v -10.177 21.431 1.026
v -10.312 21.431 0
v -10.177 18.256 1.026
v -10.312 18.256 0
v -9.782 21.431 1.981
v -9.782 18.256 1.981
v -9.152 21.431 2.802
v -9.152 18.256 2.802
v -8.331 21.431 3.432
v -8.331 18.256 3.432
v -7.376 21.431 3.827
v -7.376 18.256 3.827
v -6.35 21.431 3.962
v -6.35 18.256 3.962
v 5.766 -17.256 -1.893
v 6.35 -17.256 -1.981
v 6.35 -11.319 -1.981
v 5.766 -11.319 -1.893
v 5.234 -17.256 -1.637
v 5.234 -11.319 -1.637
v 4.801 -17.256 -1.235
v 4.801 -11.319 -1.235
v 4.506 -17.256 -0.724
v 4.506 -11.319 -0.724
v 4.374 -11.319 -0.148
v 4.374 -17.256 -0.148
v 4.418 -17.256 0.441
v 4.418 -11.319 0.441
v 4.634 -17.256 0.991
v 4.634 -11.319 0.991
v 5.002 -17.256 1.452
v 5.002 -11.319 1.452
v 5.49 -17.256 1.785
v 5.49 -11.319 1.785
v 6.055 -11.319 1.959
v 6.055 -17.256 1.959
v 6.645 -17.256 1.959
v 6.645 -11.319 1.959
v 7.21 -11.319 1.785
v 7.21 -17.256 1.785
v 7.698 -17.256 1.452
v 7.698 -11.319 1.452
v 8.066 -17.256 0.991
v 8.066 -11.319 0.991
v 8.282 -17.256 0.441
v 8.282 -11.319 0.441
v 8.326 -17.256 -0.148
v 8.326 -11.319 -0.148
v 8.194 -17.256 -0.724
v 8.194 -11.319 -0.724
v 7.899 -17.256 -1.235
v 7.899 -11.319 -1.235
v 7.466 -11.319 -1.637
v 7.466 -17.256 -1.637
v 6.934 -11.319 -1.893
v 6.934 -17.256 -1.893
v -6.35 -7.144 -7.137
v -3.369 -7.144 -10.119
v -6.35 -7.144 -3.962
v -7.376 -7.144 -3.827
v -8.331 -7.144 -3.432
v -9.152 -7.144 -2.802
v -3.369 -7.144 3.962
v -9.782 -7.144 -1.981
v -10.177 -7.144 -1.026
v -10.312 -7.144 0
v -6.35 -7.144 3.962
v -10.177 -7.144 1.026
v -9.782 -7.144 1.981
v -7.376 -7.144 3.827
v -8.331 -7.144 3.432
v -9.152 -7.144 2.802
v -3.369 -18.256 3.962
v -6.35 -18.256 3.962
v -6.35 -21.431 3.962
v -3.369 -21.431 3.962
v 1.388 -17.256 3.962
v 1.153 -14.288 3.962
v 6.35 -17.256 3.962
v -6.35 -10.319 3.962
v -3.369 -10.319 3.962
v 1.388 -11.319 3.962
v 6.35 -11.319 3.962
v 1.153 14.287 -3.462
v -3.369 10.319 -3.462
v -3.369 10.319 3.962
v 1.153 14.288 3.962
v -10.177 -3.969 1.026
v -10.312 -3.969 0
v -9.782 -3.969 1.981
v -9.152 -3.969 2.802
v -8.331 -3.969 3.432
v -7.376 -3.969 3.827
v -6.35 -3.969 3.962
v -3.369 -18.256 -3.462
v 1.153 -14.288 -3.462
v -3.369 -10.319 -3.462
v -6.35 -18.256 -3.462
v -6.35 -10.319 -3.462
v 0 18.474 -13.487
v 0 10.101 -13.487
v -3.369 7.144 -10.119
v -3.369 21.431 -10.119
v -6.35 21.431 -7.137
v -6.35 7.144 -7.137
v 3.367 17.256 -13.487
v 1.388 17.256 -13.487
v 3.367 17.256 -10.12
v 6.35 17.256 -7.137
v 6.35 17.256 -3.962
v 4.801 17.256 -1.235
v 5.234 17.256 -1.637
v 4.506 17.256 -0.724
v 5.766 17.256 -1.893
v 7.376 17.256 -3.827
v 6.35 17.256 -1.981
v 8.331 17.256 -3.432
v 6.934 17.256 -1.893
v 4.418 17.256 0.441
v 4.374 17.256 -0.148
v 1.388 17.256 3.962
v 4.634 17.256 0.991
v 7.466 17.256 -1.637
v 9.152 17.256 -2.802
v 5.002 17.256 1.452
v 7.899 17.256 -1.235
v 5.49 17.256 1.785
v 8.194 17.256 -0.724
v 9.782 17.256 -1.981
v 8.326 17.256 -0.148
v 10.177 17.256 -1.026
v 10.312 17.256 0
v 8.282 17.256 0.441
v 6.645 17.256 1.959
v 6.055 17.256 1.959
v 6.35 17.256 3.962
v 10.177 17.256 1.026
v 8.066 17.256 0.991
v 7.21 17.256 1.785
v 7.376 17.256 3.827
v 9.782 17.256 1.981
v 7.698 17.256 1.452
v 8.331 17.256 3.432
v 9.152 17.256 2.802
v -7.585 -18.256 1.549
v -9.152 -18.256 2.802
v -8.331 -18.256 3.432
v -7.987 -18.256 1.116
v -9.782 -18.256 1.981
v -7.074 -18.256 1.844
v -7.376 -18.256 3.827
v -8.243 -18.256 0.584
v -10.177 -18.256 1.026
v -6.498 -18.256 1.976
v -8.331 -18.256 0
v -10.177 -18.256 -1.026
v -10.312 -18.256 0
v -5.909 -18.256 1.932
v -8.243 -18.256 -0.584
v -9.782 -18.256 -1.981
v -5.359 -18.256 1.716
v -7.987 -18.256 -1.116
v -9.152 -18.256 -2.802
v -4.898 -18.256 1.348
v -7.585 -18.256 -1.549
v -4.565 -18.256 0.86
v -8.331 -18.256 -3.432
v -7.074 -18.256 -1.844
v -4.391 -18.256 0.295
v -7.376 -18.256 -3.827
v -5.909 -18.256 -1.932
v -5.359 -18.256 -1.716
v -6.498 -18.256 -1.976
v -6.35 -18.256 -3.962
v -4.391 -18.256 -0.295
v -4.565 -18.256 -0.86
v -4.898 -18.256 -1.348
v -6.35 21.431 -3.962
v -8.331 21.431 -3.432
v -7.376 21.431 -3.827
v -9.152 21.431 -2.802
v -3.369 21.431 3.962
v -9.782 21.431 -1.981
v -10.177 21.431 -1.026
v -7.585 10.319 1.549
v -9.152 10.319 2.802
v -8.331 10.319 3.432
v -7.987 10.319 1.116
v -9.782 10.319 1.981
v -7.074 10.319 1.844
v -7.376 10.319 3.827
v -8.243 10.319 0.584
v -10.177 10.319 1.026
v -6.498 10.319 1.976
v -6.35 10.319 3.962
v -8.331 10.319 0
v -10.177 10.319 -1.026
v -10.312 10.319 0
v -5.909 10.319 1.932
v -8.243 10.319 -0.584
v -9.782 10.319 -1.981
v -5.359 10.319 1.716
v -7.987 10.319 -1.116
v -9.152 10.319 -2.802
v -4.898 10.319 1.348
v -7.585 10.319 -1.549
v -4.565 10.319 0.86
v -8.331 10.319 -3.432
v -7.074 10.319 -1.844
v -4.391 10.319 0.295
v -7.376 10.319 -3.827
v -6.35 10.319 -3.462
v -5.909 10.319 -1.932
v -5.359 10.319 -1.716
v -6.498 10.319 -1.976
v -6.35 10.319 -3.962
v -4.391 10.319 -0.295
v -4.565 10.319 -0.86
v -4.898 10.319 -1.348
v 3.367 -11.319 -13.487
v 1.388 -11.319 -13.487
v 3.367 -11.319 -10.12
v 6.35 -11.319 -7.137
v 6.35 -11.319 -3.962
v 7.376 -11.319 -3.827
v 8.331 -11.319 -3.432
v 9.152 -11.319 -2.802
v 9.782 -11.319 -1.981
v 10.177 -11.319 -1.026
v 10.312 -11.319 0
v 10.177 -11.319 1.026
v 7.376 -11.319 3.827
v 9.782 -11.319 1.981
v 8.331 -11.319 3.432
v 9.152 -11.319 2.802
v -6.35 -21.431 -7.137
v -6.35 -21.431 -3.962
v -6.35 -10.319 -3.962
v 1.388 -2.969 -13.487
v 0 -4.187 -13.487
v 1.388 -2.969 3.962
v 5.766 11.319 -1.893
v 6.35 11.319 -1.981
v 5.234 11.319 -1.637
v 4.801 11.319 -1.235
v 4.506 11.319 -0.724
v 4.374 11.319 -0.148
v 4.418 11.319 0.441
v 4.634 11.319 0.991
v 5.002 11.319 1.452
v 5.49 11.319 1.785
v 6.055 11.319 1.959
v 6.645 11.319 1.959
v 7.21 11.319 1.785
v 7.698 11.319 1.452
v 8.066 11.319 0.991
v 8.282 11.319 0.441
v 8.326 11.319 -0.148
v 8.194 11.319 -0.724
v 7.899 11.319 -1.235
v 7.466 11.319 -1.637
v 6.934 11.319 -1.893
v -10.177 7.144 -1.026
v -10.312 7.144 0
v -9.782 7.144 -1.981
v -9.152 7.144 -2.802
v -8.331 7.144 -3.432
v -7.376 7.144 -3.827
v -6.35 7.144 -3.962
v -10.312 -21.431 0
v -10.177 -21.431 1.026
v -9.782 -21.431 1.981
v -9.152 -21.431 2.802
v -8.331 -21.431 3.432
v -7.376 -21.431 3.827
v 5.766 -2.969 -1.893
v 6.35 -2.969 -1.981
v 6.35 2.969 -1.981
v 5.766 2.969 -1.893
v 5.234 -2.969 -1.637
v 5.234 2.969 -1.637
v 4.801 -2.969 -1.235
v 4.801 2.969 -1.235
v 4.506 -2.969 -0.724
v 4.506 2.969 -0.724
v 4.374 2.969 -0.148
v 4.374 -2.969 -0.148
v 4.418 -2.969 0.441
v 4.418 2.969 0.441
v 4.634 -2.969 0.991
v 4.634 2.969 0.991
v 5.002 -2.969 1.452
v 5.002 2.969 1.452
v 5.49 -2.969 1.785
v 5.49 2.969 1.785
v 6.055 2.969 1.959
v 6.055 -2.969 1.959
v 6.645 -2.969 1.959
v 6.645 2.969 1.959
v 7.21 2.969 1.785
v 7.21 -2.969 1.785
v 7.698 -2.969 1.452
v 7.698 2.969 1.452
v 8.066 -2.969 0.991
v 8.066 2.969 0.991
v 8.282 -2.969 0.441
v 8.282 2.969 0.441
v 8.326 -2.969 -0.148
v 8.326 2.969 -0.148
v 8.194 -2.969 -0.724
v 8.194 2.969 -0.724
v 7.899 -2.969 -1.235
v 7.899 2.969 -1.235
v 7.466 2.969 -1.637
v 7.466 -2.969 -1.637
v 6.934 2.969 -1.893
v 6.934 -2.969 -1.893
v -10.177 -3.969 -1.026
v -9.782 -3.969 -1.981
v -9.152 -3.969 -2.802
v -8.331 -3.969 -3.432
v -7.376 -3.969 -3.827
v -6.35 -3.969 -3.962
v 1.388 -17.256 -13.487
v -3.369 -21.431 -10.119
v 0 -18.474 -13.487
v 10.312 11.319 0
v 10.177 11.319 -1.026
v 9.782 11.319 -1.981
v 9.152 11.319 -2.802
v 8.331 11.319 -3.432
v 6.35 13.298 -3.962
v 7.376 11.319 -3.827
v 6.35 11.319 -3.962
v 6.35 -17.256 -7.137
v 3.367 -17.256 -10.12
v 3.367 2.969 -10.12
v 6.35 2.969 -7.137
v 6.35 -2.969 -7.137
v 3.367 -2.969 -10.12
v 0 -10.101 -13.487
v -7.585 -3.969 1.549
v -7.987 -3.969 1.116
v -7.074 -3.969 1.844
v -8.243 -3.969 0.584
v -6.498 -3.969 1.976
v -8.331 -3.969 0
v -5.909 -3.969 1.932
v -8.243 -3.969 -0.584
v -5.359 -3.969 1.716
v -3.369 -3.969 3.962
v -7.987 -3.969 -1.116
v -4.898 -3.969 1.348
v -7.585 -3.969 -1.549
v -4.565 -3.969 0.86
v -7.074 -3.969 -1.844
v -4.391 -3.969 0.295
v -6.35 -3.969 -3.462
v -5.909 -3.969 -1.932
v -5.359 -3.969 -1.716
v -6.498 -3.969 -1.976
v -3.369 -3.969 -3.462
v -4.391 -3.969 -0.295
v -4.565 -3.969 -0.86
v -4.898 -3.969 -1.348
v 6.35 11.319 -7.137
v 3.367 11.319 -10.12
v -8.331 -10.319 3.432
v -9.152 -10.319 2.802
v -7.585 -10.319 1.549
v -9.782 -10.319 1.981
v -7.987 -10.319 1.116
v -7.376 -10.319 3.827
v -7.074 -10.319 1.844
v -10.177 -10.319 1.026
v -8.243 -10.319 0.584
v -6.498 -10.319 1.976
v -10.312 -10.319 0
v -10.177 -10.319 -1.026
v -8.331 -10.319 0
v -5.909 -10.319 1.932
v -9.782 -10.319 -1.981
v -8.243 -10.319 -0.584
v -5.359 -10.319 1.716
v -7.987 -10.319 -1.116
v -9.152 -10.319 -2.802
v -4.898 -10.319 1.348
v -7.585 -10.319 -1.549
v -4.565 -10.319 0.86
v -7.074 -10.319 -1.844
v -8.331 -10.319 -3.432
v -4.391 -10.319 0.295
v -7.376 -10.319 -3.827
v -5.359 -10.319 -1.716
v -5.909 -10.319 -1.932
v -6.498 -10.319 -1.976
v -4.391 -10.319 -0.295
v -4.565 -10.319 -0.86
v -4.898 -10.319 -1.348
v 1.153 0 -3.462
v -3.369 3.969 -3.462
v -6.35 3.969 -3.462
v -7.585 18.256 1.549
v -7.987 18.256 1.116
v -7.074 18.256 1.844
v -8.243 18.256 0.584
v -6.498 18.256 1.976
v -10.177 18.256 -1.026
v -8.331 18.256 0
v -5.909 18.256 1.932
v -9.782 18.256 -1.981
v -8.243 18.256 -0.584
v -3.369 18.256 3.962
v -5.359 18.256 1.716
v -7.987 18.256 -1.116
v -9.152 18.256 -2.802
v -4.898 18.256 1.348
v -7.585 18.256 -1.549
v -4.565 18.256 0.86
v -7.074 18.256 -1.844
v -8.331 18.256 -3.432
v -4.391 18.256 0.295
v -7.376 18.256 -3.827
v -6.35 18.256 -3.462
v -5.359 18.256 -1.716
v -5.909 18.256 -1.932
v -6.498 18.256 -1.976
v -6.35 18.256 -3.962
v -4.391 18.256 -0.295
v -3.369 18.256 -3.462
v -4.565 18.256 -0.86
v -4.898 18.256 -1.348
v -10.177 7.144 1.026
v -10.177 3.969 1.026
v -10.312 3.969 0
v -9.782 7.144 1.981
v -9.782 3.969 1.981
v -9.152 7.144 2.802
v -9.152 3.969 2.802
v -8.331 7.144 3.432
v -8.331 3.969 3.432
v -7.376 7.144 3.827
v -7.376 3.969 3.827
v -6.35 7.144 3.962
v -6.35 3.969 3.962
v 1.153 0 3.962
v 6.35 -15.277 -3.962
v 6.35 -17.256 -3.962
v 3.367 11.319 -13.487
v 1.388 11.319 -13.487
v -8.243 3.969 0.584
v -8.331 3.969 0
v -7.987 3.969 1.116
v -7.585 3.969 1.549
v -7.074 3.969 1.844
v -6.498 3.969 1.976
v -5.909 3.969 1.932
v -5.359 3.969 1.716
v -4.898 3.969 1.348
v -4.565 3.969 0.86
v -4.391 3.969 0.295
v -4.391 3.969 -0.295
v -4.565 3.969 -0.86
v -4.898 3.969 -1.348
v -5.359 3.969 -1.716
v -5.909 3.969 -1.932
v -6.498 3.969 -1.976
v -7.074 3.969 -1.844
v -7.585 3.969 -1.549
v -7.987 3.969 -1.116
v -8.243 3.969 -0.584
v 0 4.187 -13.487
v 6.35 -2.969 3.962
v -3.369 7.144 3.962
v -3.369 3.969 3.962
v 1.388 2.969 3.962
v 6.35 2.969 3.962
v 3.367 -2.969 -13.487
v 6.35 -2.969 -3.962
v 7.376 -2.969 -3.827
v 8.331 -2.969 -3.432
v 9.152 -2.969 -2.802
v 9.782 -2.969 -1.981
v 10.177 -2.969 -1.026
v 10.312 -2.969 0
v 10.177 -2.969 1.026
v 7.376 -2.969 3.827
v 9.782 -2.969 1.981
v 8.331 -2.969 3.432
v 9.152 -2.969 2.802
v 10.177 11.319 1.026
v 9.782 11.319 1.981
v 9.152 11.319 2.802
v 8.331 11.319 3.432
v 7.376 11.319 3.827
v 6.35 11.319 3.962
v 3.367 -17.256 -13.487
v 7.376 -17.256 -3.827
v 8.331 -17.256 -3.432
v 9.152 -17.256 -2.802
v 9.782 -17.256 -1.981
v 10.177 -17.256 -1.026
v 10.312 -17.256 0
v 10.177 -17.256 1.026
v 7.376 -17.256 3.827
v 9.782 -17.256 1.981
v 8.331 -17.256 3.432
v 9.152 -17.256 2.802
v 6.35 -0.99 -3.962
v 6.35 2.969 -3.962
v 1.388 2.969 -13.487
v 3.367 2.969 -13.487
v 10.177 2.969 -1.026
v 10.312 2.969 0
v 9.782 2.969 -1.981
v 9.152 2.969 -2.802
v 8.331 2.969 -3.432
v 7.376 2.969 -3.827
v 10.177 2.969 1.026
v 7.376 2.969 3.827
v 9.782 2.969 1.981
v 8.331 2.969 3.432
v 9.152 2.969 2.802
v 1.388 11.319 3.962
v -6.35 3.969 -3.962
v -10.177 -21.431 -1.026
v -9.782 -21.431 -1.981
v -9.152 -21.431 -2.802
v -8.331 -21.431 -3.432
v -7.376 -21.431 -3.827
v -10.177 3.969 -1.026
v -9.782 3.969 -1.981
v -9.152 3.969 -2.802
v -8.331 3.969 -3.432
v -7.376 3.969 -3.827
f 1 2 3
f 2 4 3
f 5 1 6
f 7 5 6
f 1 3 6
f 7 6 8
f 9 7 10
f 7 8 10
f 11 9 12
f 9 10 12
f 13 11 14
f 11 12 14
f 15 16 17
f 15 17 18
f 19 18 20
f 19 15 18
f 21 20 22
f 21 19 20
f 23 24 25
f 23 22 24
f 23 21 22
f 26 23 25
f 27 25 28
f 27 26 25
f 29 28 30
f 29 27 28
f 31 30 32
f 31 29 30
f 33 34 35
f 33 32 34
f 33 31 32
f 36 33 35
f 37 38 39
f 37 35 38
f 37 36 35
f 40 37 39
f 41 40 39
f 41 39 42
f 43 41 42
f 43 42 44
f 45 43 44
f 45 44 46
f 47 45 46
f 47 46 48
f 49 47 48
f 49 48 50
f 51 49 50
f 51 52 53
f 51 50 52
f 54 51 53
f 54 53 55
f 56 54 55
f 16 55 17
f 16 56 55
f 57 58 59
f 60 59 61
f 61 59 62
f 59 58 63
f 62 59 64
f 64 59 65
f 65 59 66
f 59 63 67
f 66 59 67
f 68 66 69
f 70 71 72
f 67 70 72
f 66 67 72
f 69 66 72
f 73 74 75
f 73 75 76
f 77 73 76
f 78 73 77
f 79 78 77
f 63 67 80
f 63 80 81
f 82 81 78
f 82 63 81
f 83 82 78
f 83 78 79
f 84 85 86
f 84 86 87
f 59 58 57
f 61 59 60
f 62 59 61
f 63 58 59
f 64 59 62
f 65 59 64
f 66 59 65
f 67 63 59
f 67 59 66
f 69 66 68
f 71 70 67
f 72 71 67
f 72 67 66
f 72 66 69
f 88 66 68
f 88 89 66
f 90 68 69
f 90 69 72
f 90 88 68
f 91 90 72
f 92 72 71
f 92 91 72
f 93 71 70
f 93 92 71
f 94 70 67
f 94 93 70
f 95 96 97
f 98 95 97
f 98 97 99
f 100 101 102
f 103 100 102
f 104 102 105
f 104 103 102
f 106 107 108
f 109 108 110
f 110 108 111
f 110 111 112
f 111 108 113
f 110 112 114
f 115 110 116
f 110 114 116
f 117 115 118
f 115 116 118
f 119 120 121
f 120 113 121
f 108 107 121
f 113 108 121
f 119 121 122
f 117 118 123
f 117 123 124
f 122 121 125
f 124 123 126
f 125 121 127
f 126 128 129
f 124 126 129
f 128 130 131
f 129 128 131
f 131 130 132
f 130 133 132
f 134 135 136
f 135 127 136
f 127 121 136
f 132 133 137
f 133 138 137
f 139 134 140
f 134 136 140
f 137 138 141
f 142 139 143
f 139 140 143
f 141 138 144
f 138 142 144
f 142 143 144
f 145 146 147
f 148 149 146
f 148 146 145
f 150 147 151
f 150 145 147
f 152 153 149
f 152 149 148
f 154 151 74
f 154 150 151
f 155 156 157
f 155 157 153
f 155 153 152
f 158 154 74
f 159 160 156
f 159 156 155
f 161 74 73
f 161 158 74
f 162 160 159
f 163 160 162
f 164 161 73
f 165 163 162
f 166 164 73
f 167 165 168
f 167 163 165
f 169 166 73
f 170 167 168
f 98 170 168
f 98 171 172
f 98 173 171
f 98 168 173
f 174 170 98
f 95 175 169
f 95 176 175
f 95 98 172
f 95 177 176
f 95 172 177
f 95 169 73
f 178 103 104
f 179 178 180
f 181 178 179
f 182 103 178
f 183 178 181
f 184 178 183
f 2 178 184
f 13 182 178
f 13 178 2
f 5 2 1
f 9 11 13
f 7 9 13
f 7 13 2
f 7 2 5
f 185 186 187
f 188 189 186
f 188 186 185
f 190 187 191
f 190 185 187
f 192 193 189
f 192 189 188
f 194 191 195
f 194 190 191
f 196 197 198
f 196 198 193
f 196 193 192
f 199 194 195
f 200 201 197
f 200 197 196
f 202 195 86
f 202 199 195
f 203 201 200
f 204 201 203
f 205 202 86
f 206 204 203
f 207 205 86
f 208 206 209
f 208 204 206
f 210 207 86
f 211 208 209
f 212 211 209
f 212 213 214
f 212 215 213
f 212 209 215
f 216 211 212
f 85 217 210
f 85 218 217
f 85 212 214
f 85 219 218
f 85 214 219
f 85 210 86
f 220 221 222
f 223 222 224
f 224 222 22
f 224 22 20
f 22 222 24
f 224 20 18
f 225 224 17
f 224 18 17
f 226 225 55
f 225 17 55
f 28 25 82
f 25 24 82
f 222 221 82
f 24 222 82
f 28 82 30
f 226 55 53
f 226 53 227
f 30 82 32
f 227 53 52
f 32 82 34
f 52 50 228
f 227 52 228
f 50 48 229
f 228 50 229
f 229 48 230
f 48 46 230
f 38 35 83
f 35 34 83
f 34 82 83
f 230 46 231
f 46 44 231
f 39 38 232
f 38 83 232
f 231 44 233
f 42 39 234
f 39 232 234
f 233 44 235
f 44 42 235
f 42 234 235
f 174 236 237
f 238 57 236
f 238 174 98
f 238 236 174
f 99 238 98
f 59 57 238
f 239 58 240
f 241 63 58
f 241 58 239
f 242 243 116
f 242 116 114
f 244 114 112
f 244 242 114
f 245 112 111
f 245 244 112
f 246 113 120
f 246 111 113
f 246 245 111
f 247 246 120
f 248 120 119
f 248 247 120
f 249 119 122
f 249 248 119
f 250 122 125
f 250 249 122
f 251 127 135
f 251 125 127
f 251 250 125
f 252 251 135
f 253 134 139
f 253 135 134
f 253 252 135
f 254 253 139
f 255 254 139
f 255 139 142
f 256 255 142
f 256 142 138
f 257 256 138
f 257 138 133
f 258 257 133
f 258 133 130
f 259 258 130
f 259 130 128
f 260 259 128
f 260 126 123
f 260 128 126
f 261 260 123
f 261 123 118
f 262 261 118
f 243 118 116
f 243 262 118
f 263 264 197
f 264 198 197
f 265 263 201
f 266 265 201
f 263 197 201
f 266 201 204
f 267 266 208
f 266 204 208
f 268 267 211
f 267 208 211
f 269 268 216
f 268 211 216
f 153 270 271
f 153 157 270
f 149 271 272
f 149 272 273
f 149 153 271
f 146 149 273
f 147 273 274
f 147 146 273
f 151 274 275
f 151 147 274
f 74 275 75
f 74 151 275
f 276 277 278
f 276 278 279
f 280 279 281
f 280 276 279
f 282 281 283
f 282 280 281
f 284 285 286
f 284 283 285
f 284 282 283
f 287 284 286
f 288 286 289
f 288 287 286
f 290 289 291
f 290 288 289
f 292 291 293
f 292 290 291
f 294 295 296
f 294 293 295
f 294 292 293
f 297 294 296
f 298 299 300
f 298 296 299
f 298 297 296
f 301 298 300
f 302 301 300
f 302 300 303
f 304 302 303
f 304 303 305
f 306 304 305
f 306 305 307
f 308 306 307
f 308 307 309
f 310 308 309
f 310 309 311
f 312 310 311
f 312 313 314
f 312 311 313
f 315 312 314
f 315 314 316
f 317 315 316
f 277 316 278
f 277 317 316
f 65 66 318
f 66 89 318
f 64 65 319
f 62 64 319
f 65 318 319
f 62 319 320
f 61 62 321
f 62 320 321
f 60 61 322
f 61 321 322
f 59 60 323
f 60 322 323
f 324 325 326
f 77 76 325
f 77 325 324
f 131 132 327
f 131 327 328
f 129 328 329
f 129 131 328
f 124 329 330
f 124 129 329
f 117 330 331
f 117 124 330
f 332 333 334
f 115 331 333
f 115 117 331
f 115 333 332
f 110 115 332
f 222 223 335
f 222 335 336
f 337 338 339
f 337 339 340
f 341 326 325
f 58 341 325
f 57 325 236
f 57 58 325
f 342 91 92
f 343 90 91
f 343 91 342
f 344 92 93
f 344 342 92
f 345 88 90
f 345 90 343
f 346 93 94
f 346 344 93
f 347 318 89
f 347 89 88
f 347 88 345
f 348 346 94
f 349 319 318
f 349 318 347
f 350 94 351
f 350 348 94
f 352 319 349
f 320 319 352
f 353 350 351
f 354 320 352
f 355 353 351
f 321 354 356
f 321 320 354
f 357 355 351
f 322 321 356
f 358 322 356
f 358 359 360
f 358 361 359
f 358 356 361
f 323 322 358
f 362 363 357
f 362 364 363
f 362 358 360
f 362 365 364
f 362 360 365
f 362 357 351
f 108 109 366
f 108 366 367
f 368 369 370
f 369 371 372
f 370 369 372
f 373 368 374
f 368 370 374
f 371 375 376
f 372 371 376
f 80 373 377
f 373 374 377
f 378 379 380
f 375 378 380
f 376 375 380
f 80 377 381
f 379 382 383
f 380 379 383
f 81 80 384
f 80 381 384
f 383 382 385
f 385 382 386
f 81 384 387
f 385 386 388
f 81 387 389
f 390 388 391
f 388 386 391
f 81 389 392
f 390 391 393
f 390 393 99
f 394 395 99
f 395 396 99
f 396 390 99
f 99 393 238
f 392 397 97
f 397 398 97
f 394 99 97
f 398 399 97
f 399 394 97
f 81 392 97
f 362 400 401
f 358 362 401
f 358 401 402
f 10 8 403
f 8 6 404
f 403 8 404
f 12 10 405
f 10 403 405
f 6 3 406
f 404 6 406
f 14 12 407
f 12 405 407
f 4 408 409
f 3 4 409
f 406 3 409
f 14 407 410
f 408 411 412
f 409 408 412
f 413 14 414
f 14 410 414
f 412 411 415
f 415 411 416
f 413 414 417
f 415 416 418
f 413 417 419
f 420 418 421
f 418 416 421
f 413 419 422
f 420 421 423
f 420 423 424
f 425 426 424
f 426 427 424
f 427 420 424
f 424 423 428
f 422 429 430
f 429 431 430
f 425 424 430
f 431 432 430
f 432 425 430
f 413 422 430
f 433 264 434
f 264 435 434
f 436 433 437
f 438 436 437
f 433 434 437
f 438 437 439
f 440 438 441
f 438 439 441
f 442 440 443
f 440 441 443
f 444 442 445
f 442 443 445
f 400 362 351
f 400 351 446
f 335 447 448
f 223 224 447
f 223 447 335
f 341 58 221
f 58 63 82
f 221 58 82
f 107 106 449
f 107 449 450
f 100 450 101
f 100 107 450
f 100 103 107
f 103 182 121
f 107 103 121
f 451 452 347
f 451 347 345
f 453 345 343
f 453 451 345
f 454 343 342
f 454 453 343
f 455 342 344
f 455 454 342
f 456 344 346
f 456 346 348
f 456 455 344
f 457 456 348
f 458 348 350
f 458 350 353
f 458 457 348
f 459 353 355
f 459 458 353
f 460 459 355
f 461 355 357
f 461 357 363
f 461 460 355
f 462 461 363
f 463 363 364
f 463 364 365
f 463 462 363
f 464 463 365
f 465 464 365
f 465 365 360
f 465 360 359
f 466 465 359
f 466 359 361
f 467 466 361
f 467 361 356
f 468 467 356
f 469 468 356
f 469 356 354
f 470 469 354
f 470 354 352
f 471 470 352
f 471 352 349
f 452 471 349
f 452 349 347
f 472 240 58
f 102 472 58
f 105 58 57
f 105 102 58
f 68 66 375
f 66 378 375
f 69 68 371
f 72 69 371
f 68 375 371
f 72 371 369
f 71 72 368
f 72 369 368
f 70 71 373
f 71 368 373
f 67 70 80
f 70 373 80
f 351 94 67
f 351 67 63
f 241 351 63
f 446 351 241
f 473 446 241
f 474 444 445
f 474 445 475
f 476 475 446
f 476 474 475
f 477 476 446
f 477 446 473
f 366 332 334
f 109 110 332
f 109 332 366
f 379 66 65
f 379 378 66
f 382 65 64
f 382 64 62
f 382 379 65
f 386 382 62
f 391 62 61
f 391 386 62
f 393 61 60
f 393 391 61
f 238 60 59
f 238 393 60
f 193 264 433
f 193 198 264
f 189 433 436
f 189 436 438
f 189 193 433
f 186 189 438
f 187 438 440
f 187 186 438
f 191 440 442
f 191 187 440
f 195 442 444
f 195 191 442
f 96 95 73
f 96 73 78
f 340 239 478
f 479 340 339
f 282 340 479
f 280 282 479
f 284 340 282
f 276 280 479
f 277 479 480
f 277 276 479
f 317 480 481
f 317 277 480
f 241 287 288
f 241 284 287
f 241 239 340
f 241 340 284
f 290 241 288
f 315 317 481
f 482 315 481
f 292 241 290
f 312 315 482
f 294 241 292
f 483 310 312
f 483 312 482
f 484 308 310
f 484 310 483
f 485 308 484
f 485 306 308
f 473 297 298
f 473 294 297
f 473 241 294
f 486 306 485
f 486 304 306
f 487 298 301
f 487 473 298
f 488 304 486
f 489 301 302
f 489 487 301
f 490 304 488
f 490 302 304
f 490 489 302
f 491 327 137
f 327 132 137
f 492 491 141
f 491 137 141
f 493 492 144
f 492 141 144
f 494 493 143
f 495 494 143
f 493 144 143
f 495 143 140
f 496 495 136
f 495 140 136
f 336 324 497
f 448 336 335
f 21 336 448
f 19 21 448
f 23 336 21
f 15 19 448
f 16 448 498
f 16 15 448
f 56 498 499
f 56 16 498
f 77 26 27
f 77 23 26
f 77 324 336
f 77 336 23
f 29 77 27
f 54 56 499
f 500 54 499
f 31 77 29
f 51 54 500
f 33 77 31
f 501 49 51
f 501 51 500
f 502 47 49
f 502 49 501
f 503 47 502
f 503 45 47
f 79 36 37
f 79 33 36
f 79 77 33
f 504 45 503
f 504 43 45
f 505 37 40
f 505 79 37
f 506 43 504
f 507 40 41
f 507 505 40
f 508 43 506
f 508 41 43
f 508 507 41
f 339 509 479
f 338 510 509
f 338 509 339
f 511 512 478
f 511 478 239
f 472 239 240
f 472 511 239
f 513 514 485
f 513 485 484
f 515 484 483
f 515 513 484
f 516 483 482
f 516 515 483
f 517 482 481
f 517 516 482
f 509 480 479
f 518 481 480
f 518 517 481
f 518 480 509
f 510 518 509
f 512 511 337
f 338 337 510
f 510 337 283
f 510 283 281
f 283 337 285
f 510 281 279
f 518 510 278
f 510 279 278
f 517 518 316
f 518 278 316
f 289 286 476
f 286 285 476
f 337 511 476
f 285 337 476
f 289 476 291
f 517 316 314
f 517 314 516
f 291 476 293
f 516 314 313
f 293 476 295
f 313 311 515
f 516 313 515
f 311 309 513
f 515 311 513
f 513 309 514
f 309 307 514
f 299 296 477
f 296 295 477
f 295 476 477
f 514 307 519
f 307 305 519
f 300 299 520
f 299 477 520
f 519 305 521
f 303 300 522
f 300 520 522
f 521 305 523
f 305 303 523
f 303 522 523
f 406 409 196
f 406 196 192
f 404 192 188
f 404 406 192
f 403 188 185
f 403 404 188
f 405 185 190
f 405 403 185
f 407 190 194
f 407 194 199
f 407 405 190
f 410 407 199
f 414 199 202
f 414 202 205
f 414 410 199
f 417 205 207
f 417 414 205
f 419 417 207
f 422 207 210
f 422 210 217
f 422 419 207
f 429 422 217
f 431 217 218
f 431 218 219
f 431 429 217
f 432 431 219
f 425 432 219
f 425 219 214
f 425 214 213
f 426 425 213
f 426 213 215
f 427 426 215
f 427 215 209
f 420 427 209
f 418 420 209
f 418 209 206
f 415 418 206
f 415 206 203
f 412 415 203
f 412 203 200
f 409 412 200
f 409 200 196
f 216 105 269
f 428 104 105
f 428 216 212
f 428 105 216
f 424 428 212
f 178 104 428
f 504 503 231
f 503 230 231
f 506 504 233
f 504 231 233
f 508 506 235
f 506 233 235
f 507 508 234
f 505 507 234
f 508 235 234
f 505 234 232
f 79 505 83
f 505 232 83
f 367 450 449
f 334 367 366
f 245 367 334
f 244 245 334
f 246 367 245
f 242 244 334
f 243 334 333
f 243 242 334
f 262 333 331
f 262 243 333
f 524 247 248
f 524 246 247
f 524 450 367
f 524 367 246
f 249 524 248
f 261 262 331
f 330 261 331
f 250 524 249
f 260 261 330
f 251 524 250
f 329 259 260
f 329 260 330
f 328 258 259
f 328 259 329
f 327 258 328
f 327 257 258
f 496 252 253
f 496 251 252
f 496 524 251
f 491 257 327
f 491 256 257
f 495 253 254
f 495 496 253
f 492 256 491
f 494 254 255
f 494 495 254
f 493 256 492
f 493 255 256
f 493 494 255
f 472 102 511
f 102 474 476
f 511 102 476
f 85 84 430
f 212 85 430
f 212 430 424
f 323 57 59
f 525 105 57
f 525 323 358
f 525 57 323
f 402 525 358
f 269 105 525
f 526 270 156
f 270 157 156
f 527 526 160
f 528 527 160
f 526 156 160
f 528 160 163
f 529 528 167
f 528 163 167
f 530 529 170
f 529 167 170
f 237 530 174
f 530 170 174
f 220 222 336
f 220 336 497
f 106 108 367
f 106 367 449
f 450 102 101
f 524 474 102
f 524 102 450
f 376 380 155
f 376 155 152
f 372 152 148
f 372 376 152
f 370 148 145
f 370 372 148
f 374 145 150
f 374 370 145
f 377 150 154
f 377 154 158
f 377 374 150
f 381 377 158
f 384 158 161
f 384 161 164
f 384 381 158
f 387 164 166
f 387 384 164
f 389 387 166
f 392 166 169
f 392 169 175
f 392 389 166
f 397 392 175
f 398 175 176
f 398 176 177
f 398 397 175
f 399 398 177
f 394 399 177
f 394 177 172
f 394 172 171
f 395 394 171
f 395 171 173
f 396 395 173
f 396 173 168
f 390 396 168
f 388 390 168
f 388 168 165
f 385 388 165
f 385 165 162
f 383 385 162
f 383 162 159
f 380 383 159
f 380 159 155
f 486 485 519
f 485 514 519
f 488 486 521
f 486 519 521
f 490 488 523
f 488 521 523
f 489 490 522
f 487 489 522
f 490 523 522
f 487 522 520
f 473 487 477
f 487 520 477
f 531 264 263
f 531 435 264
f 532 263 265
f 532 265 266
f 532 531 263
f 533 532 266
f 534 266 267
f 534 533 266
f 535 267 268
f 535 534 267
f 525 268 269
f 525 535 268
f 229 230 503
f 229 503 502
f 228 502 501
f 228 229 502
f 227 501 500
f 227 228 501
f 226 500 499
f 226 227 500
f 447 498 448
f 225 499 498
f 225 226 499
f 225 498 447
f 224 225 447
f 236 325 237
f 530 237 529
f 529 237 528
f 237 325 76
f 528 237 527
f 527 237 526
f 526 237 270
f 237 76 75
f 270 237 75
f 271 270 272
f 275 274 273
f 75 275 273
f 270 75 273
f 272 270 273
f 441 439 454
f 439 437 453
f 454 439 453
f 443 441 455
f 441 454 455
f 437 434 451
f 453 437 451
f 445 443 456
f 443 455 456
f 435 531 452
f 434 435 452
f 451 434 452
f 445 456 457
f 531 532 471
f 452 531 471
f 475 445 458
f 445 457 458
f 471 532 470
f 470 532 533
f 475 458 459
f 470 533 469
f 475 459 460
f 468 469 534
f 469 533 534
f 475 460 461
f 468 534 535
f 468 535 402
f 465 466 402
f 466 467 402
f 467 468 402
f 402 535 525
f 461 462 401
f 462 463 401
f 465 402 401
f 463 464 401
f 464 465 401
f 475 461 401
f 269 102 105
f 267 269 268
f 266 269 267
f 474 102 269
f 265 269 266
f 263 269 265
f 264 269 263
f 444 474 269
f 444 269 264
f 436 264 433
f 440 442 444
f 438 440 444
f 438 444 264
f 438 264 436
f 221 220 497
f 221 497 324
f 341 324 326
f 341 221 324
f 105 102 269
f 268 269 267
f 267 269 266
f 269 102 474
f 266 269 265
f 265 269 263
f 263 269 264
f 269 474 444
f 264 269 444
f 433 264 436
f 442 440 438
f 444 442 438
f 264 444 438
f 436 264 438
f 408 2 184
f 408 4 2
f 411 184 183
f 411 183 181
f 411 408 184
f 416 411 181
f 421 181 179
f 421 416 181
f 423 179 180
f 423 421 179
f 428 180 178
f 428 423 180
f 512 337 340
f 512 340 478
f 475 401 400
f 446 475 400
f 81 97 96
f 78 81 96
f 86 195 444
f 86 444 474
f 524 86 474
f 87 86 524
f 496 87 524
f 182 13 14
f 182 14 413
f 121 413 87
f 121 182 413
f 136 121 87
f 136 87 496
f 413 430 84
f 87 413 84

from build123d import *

# Parameters (mm, degrees)
SWEEP1_START            = -3.9624
SWEEP1_DEPTH            = 7.9248
FILLET1_R               = 3.9624
BOSS_EXTRUDE3_START     = 17.25625
SKETCH1_11_R            = 3.9624
BOSS_EXTRUDE3_DEPTH     = 5.937499936
CUT_EXTRUDE4_DEPTH      = 25.111090479
CUT_EXTRUDE4_DEPTH_BACK = 25.111090479
SKETCH1_7_R             = 1.9812
BOSS_EXTRUDE1_START     = 21.43125
SKETCH1_R               = 1.9812
BOSS_EXTRUDE1_DEPTH     = 14.2875
BOSS_EXTRUDE5_START     = 21.43125
SKETCH5_W               = 12.7
SKETCH5_H               = 0.500000016
SKETCH5_H_2             = 3.175
BOSS_EXTRUDE5_DEPTH     = 14.2875
CUT_EXTRUDE5_DEPTH      = 28.341434291
LPATTERN4_COUNT         = 3
LPATTERN4_PITCH         = 14.2875


# Read off the part's stored shape, not the designer's step: Sweep1
with BuildPart() as part:
    # Sweep1 outline → Sweep1 (new body)
    with BuildSketch(Plane.XY.offset(SWEEP1_START)):
        Polygon((1.387599968, 14.081249968), (10.3124, 14.081249968), (10.3124, 17.256249968), (1.387599968, 17.256249968), (-3.368799968, 21.43125), (-10.3124, 21.43125), (-10.3124, 18.25625), (-3.368799968, 18.25625), align=None)
    extrude(amount=SWEEP1_DEPTH)

    # Fillet1
    fillet1_edges = [part.edges().sort_by_distance(p)[0] for p in [
        (-10.3124, 19.84375, 3.9624),
        (-10.3124, 19.84375, -3.9624),
        (10.3124, 15.668749968, -3.9624),
        (10.3124, 15.668749968, 3.9624),
    ]]
    fillet(fillet1_edges, radius=FILLET1_R - 0.0001)  # a hair under: the kernel refuses the full size

    # Mirror3: part across plane


with BuildPart() as part_1:
    add(part.part)
    add(part.part.mirror(Plane.ZX.offset(14.2875)))

    # Sketch1<11> → Boss-Extrude3 (add)
    with BuildSketch(Plane(origin=(0, 0, 0), x_dir=(-1, 0, 0), z_dir=(0, 1, 0)).offset(BOSS_EXTRUDE3_START)):
        with Locations((-6.35, 0)):
            Circle(SKETCH1_11_R)
    extrude(amount=-BOSS_EXTRUDE3_DEPTH)

    # Sketch1<7> → Cut-Extrude4 (cut, two sides: drawn at the far end of the back side and taken through both)
    with BuildSketch(Plane(origin=(0, 0, 0), x_dir=(-1, 0, 0), z_dir=(0, 1, 0)).offset(-CUT_EXTRUDE4_DEPTH_BACK)):
        with Locations(Location((-6.35, 0, 0), (0, 0, 270))):
            Circle(SKETCH1_7_R)
    extrude(amount=CUT_EXTRUDE4_DEPTH + CUT_EXTRUDE4_DEPTH_BACK, mode=Mode.SUBTRACT)

    # Sketch1 → Boss-Extrude1 (add)
    with BuildSketch(Plane(origin=(0, 0, 0), x_dir=(-1, 0, 0), z_dir=(0, 1, 0)).offset(BOSS_EXTRUDE1_START)):
        with Locations((6.35, 0)):
            Circle(SKETCH1_R)
    extrude(amount=-BOSS_EXTRUDE1_DEPTH)

    # Sketch5 → Boss-Extrude5 (add)
    with BuildSketch(Plane(origin=(0, 0, 0), x_dir=(-1, 0, 0), z_dir=(0, 1, 0)).offset(BOSS_EXTRUDE5_START)):
        with Locations((0, -3.712399992)):
            Rectangle(SKETCH5_W, SKETCH5_H)
        with Locations((0, -5.5499)):
            Rectangle(SKETCH5_W, SKETCH5_H_2)
        Polygon((6.35, -7.1374), (-6.35, -7.1374), (-3.367213597, -10.120186403), (-3.367213597, -13.4874), (0, -13.4874), align=None)
    extrude(amount=-BOSS_EXTRUDE5_DEPTH)

    # Sketch2<5> → Cut-Extrude5 (cut, symmetric)
    with BuildSketch(Plane(origin=(0, 0, 0), x_dir=(0, 1, 0), z_dir=(0, 0, 1))):
        Polygon((21.43125, 70.492676256), (21.43125, 10.3124), (21.43125, 3.368799968), (17.256249968, -1.387599968), (17.256249968, -10.3124), (17.256249968, -70.492676256), (137.564063269, -74.055352204), (141.739063301, 66.930000309), align=None)
    cut_extrude5 = extrude(amount=CUT_EXTRUDE5_DEPTH, both=True, mode=Mode.SUBTRACT)

    # Mirror7: Cut-Extrude5 across plane
    add(cut_extrude5.mirror(Plane.ZX.offset(14.2875)), mode=Mode.SUBTRACT)


with BuildPart() as lpattern4_1:
    # LPattern4: pattern copy
    add(part_1.part.moved(Location(Vector(0, -1, 0) * (1 * LPATTERN4_PITCH))))


with BuildPart() as lpattern4_2:
    # LPattern4: pattern copy
    add(part_1.part.moved(Location(Vector(0, -1, 0) * (2 * LPATTERN4_PITCH))))


solid = Compound([part_1.part, lpattern4_1.part, lpattern4_2.part])
